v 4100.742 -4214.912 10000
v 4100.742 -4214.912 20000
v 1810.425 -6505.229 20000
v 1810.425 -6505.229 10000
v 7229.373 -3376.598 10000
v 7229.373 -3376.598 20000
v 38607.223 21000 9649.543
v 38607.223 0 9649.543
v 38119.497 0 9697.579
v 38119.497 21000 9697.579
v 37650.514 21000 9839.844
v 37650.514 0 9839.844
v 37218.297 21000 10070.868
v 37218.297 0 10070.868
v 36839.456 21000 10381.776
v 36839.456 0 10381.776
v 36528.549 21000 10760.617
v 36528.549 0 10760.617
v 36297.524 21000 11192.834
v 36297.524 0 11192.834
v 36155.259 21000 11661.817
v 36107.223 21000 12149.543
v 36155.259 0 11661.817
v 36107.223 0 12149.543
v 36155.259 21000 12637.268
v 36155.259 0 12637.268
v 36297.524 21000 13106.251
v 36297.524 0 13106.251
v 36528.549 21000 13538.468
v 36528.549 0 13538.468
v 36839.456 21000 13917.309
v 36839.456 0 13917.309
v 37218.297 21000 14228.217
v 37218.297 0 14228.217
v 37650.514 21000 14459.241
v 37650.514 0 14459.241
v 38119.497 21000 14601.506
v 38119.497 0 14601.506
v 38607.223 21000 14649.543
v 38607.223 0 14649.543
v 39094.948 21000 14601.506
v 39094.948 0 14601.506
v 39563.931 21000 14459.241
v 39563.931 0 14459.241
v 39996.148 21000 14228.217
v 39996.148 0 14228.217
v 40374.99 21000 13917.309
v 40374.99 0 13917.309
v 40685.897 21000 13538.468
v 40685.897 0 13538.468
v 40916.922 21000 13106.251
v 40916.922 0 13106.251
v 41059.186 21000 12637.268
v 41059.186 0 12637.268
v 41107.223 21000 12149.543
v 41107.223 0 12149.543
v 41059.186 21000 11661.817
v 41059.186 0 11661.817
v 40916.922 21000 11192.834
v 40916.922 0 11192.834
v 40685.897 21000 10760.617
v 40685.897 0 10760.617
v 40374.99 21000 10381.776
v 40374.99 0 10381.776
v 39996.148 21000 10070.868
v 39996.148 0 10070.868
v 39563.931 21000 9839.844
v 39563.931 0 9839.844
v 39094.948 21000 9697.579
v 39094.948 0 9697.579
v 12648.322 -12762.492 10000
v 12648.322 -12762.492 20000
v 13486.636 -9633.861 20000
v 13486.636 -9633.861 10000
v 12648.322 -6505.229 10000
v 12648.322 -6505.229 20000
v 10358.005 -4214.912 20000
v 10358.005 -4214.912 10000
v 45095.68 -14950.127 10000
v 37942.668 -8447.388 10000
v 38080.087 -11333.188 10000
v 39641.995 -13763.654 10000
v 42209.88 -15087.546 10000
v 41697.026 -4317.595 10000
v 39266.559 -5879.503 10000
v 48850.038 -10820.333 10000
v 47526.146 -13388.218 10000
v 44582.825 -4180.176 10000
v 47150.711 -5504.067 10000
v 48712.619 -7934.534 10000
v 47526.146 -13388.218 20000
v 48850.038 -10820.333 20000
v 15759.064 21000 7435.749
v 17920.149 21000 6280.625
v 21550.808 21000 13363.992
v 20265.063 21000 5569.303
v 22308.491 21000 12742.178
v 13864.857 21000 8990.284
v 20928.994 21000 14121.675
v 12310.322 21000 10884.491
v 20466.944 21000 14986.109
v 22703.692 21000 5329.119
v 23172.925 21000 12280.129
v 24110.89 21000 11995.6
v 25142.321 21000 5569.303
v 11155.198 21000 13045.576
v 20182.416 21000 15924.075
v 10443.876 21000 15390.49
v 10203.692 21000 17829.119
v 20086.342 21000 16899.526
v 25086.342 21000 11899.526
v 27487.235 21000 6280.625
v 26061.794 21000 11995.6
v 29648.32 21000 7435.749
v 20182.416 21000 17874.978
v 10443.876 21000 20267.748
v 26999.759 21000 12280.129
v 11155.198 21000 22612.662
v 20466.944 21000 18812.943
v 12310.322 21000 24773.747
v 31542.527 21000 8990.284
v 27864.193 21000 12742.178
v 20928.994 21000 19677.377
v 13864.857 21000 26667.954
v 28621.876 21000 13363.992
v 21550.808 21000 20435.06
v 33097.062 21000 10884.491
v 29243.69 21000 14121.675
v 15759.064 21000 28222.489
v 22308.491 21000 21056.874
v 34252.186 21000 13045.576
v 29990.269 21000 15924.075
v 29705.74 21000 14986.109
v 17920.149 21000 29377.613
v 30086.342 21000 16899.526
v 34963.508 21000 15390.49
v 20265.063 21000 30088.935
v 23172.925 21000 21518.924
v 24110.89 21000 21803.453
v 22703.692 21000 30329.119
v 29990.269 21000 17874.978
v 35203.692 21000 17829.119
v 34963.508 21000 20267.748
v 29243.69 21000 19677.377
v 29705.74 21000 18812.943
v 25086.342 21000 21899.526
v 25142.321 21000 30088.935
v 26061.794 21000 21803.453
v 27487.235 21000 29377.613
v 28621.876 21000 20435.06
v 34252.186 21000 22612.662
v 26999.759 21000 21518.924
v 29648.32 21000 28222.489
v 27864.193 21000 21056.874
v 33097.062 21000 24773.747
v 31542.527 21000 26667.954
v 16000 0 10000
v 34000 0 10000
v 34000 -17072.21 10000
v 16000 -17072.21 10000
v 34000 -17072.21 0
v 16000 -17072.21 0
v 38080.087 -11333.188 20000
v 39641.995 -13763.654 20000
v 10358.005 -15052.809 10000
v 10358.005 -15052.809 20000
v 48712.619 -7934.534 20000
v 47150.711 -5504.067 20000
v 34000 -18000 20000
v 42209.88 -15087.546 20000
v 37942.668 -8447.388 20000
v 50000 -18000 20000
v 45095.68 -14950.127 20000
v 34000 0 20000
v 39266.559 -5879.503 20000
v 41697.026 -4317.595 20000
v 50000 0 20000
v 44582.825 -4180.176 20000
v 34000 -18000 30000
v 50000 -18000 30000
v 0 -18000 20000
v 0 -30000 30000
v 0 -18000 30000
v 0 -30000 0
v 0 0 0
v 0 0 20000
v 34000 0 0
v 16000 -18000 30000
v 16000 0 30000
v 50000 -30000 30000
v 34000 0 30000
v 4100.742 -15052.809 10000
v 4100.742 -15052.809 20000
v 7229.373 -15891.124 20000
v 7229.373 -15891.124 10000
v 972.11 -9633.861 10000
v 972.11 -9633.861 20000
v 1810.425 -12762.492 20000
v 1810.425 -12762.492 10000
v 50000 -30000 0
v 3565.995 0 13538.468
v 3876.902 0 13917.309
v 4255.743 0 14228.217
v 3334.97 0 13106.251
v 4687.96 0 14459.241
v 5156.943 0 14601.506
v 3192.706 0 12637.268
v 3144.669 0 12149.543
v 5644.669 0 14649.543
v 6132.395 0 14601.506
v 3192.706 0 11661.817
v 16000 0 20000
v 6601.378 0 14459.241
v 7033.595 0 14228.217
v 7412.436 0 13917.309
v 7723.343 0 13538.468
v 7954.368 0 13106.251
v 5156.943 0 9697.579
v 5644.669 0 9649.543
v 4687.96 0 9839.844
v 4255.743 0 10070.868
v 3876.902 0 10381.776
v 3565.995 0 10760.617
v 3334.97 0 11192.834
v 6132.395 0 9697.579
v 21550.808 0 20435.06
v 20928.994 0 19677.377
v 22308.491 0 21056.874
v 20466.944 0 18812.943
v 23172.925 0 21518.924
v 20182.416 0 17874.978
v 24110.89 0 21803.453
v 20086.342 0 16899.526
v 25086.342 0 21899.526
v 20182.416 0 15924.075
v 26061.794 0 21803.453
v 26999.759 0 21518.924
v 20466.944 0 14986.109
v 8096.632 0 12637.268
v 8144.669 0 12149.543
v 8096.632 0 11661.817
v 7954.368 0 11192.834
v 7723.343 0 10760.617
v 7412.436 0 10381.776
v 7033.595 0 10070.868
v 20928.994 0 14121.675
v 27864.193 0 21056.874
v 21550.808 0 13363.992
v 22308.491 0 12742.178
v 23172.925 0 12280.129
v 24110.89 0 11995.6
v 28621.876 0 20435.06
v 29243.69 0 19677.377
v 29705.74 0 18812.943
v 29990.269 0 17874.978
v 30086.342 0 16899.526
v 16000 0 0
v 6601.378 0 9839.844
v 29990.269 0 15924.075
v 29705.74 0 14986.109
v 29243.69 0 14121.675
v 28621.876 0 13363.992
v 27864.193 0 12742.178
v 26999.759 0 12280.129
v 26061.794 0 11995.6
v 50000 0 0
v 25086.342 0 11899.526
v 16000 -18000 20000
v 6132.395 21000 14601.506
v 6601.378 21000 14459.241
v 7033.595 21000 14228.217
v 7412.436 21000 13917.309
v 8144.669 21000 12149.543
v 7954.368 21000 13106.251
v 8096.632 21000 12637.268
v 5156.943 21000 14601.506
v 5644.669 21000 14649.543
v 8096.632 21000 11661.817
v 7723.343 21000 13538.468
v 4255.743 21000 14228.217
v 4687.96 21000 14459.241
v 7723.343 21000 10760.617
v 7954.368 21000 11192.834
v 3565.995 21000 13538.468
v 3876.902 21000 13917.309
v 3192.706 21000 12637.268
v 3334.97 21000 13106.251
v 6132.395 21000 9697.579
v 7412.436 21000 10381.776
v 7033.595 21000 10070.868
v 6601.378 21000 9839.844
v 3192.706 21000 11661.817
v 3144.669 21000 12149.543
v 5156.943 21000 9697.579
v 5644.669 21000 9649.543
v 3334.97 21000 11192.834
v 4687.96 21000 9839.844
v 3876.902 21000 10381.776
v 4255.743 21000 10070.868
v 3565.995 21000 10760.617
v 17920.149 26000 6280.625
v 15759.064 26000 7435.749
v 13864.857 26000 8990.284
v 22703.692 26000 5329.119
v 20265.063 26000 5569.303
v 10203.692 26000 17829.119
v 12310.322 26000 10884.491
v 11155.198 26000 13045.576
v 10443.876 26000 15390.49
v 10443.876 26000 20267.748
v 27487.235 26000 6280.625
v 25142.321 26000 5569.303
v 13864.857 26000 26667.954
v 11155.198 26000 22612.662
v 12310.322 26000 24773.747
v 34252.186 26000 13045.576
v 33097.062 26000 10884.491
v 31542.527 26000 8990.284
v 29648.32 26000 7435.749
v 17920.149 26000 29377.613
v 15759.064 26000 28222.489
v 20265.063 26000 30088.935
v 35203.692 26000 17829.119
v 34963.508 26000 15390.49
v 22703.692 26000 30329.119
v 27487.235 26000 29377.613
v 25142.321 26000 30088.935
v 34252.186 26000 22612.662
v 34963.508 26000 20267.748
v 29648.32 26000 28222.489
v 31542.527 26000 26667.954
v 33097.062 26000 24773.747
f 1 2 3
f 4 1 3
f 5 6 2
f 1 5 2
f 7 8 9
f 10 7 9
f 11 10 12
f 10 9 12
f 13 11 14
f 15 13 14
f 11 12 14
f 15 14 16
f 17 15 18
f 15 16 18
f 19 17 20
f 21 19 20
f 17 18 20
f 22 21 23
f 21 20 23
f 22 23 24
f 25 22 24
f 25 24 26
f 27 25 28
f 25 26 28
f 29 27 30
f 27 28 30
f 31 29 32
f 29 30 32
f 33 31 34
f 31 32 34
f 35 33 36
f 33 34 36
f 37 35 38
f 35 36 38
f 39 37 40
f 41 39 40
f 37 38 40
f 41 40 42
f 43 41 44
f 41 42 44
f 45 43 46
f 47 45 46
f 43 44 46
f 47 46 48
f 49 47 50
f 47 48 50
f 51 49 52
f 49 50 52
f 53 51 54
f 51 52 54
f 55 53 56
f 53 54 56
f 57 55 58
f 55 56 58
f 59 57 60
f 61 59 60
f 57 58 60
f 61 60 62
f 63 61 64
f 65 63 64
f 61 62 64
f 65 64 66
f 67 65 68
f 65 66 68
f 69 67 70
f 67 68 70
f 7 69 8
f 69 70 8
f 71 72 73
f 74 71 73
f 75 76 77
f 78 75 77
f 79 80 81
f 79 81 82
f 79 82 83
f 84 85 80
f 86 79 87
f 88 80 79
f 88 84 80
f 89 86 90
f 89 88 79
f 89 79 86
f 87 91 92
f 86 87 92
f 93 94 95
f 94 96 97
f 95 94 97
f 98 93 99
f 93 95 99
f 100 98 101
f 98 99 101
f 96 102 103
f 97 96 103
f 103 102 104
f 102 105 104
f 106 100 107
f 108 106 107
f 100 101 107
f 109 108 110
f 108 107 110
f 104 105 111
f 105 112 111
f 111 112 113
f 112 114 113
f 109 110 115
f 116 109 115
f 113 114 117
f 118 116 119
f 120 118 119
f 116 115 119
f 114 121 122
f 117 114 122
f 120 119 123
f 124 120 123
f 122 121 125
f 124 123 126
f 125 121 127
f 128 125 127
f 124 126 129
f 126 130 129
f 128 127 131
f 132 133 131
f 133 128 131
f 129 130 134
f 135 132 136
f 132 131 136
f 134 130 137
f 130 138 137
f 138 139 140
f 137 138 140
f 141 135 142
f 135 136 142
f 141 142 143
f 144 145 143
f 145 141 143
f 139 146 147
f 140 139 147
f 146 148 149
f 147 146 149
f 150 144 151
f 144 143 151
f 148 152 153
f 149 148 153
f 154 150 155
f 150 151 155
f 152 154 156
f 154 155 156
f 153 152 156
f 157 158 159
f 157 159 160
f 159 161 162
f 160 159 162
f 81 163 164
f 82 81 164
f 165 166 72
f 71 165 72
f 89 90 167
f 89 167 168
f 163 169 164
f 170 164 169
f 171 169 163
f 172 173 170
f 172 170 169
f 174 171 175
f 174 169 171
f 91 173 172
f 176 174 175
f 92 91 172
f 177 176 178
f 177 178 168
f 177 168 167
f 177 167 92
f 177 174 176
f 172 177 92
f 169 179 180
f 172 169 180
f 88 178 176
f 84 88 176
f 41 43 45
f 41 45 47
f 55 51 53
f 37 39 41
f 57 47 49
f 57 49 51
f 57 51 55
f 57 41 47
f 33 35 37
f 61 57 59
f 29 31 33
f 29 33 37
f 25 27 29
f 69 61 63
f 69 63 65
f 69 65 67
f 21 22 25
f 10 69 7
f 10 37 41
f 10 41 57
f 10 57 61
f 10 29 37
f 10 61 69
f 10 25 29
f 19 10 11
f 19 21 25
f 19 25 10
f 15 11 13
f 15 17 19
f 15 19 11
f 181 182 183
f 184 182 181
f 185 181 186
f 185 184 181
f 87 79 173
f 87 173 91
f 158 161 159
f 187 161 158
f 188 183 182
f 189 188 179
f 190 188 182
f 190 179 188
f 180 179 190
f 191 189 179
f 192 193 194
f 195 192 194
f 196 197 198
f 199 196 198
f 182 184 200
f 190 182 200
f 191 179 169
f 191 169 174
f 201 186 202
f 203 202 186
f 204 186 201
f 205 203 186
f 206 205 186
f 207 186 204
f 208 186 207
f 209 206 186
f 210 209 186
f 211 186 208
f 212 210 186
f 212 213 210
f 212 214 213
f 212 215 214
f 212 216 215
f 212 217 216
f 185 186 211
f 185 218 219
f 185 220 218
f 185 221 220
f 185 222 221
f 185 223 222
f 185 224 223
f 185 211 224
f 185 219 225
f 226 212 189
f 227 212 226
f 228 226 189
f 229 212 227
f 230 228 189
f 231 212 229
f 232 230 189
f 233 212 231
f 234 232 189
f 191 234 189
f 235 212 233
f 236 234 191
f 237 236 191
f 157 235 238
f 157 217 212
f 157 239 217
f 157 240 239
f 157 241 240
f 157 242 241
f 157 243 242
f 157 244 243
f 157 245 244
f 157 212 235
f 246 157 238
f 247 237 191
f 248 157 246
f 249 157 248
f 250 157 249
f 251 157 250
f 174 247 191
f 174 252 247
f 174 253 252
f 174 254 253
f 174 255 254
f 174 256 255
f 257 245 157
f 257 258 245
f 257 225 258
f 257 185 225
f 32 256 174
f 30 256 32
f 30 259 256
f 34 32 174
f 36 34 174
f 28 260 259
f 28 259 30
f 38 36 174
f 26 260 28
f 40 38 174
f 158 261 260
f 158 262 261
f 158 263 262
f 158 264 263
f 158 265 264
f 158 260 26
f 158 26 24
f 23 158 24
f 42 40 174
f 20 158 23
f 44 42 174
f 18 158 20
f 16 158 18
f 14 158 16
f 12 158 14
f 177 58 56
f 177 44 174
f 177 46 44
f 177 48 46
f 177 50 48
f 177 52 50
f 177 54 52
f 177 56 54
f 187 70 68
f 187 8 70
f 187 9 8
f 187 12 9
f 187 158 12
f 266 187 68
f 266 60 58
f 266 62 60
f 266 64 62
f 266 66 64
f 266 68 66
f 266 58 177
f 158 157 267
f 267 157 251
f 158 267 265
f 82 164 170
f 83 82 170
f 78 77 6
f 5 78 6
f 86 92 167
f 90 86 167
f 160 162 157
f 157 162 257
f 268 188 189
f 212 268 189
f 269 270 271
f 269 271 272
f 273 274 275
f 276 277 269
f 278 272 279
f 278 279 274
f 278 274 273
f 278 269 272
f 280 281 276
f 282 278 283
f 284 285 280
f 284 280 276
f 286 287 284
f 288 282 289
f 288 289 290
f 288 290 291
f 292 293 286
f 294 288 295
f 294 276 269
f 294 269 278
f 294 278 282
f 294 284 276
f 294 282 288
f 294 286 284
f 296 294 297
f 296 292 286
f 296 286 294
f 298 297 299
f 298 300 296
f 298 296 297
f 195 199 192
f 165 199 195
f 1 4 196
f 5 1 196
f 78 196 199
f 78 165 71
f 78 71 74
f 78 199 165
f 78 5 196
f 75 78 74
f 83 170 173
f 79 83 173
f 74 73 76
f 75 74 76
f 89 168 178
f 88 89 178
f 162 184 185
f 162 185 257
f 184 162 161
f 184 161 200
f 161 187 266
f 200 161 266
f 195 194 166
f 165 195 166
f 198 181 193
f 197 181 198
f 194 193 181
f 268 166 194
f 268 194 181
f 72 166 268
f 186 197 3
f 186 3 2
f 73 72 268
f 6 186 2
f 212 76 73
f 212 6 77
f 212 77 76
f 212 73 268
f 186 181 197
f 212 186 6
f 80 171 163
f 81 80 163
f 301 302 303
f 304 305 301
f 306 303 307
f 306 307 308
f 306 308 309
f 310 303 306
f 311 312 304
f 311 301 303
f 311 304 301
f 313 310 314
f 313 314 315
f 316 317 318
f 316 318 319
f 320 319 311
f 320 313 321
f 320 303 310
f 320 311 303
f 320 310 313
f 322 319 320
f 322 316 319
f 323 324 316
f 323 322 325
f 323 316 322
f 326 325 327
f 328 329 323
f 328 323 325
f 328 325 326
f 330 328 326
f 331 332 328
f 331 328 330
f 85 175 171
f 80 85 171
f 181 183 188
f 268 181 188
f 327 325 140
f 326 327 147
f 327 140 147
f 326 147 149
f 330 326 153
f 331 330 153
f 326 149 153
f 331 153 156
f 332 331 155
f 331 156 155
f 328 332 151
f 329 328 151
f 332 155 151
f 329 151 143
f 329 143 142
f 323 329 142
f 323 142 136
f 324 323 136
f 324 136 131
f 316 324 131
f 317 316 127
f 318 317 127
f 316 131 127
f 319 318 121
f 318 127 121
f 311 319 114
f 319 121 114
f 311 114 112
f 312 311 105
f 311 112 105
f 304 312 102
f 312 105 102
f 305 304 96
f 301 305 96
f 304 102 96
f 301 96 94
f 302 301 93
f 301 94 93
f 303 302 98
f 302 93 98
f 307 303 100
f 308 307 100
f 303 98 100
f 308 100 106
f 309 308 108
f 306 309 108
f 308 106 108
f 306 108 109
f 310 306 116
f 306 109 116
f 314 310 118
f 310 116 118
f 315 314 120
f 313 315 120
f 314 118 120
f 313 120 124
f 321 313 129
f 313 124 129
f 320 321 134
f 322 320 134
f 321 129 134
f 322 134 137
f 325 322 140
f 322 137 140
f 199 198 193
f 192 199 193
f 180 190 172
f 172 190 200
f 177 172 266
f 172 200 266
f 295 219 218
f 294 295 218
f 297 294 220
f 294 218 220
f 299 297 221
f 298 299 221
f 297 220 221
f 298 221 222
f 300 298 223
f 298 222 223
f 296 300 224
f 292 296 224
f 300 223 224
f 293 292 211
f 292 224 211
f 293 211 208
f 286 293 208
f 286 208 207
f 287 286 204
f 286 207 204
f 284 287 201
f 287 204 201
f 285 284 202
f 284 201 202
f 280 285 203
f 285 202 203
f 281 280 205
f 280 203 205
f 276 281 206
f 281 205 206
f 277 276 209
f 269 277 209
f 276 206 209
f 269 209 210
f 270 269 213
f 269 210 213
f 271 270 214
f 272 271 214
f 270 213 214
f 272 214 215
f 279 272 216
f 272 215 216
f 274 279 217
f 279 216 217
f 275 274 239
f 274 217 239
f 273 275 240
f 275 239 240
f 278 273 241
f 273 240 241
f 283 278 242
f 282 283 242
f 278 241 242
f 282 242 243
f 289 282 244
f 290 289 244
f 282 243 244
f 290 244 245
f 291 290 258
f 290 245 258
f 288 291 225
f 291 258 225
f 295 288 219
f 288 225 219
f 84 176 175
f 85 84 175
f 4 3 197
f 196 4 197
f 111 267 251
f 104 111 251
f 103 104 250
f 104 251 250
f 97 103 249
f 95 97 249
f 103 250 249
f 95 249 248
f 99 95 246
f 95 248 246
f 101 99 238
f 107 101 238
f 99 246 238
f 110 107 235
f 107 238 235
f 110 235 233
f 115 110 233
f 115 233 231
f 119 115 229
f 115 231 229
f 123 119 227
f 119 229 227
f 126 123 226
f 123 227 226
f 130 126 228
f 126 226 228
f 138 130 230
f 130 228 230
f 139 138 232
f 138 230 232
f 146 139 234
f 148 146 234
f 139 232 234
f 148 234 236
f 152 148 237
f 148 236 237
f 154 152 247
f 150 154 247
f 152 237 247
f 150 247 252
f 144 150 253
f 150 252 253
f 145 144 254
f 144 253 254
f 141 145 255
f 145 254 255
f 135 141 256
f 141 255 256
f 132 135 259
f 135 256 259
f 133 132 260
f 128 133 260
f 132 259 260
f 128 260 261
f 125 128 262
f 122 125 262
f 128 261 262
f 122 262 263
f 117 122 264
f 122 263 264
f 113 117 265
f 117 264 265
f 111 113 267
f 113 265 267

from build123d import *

# Parameters (mm, degrees)
SKETCH1_W           = 50000
SKETCH1_H           = 30000
BOSS_EXTRUDE1_DEPTH = 30000
SKETCH2_W           = 16000
SKETCH2_H           = 18000
CUT_EXTRUDE1_DEPTH  = 10000
SKETCH3_W           = 18000
SKETCH3_H           = 17072.210439065
CUT_EXTRUDE2_DEPTH  = 10000
SKETCH4_R           = 5000
BOSS_EXTRUDE2_DEPTH = 21000
SKETCH5_R           = 12500
BOSS_EXTRUDE3_DEPTH = 5000
CUT_EXTRUDE3_DEPTH  = 10000
CUT_EXTRUDE4_DEPTH  = 10000
SKETCH8_R           = 2500
BOSS_EXTRUDE4_DEPTH = 21000


with BuildPart() as part:
    # Sketch1 → Boss-Extrude1 (new body)
    with BuildSketch(Plane.XY):
        with Locations((25000, -15000)):
            Rectangle(SKETCH1_W, SKETCH1_H)
    extrude(amount=BOSS_EXTRUDE1_DEPTH)

    # Sketch2 → Cut-Extrude1 (cut)
    with BuildSketch(Plane.XY.offset(30000)):
        with Locations((8000, -9000)):
            Rectangle(SKETCH2_W, SKETCH2_H)
        with Locations((42000, -9000)):
            Rectangle(SKETCH2_W, SKETCH2_H)
    extrude(amount=-CUT_EXTRUDE1_DEPTH, mode=Mode.SUBTRACT)

    # Sketch3 → Cut-Extrude2 (cut)
    with BuildSketch(Plane(origin=(0, 0, 0), x_dir=(-1, 0, 0), z_dir=(0, 0, -1))):
        with Locations((-25000, -8536.105219533)):
            Rectangle(SKETCH3_W, SKETCH3_H)
    extrude(amount=-CUT_EXTRUDE2_DEPTH, mode=Mode.SUBTRACT)

    # Sketch4 → Boss-Extrude2 (add)
    with BuildSketch(Plane(origin=(0, 0, 0), x_dir=(1, 0, 0), z_dir=(0, 1, 0))):
        with Locations(Location((25086.342101628, -16899.52623581, 0), (0, 0, 90))):
            Circle(SKETCH4_R)
    extrude(amount=BOSS_EXTRUDE2_DEPTH)

    # Sketch5 → Boss-Extrude3 (add)
    with BuildSketch(Plane(origin=(0, 21000, 0), x_dir=(1, 0, 0), z_dir=(0, 1, 0))):
        with Locations(Location((22703.691843144, -17829.118745341, 0), (0, 0, 270))):
            Circle(SKETCH5_R)
    extrude(amount=BOSS_EXTRUDE3_DEPTH)

    # Sketch6 → Cut-Extrude3 (cut)
    with BuildSketch(Plane.XY.offset(20000)):
        Polygon((13486.636274247, -9633.860731206), (12648.322004551, -6505.22928399), (10358.004827031, -4214.912106471), (7229.373379816, -3376.597836775), (4100.7419326, -4214.912106471), (1810.424755081, -6505.22928399), (972.110485385, -9633.860731206), (1810.424755081, -12762.492178421), (4100.7419326, -15052.809355941), (7229.373379816, -15891.123625637), (10358.004827031, -15052.809355941), (12648.322004551, -12762.492178421), align=None)
    extrude(amount=-CUT_EXTRUDE3_DEPTH, mode=Mode.SUBTRACT)

    # Sketch7 → Cut-Extrude4 (cut)
    with BuildSketch(Plane.XY.offset(20000)):
        Polygon((39266.559399303, -5879.502994547), (37942.667948973, -8447.388311527), (38080.086979624, -11333.187955202), (39641.995172969, -13763.654241531), (42209.880489949, -15087.545691861), (45095.680133623, -14950.126661209), (47526.146419952, -13388.218467865), (48850.037870282, -10820.333150885), (48712.618839631, -7934.53350721), (47150.710646286, -5504.067220882), (44582.825329306, -4180.175770552), (41697.025685631, -4317.594801203), align=None)
    extrude(amount=-CUT_EXTRUDE4_DEPTH, mode=Mode.SUBTRACT)

    # Sketch8 → Boss-Extrude4 (add)
    with BuildSketch(Plane(origin=(0, 0, 0), x_dir=(1, 0, 0), z_dir=(0, 1, 0))):
        with Locations(Location((38607.22266917, -12149.542526099, 0), (0, 0, 90))):
            Circle(SKETCH8_R)
        with Locations(Location((5644.669008724, -12149.542526099, 0), (0, 0, 90))):
            Circle(SKETCH8_R)
    extrude(amount=BOSS_EXTRUDE4_DEPTH)


solid = part.part
